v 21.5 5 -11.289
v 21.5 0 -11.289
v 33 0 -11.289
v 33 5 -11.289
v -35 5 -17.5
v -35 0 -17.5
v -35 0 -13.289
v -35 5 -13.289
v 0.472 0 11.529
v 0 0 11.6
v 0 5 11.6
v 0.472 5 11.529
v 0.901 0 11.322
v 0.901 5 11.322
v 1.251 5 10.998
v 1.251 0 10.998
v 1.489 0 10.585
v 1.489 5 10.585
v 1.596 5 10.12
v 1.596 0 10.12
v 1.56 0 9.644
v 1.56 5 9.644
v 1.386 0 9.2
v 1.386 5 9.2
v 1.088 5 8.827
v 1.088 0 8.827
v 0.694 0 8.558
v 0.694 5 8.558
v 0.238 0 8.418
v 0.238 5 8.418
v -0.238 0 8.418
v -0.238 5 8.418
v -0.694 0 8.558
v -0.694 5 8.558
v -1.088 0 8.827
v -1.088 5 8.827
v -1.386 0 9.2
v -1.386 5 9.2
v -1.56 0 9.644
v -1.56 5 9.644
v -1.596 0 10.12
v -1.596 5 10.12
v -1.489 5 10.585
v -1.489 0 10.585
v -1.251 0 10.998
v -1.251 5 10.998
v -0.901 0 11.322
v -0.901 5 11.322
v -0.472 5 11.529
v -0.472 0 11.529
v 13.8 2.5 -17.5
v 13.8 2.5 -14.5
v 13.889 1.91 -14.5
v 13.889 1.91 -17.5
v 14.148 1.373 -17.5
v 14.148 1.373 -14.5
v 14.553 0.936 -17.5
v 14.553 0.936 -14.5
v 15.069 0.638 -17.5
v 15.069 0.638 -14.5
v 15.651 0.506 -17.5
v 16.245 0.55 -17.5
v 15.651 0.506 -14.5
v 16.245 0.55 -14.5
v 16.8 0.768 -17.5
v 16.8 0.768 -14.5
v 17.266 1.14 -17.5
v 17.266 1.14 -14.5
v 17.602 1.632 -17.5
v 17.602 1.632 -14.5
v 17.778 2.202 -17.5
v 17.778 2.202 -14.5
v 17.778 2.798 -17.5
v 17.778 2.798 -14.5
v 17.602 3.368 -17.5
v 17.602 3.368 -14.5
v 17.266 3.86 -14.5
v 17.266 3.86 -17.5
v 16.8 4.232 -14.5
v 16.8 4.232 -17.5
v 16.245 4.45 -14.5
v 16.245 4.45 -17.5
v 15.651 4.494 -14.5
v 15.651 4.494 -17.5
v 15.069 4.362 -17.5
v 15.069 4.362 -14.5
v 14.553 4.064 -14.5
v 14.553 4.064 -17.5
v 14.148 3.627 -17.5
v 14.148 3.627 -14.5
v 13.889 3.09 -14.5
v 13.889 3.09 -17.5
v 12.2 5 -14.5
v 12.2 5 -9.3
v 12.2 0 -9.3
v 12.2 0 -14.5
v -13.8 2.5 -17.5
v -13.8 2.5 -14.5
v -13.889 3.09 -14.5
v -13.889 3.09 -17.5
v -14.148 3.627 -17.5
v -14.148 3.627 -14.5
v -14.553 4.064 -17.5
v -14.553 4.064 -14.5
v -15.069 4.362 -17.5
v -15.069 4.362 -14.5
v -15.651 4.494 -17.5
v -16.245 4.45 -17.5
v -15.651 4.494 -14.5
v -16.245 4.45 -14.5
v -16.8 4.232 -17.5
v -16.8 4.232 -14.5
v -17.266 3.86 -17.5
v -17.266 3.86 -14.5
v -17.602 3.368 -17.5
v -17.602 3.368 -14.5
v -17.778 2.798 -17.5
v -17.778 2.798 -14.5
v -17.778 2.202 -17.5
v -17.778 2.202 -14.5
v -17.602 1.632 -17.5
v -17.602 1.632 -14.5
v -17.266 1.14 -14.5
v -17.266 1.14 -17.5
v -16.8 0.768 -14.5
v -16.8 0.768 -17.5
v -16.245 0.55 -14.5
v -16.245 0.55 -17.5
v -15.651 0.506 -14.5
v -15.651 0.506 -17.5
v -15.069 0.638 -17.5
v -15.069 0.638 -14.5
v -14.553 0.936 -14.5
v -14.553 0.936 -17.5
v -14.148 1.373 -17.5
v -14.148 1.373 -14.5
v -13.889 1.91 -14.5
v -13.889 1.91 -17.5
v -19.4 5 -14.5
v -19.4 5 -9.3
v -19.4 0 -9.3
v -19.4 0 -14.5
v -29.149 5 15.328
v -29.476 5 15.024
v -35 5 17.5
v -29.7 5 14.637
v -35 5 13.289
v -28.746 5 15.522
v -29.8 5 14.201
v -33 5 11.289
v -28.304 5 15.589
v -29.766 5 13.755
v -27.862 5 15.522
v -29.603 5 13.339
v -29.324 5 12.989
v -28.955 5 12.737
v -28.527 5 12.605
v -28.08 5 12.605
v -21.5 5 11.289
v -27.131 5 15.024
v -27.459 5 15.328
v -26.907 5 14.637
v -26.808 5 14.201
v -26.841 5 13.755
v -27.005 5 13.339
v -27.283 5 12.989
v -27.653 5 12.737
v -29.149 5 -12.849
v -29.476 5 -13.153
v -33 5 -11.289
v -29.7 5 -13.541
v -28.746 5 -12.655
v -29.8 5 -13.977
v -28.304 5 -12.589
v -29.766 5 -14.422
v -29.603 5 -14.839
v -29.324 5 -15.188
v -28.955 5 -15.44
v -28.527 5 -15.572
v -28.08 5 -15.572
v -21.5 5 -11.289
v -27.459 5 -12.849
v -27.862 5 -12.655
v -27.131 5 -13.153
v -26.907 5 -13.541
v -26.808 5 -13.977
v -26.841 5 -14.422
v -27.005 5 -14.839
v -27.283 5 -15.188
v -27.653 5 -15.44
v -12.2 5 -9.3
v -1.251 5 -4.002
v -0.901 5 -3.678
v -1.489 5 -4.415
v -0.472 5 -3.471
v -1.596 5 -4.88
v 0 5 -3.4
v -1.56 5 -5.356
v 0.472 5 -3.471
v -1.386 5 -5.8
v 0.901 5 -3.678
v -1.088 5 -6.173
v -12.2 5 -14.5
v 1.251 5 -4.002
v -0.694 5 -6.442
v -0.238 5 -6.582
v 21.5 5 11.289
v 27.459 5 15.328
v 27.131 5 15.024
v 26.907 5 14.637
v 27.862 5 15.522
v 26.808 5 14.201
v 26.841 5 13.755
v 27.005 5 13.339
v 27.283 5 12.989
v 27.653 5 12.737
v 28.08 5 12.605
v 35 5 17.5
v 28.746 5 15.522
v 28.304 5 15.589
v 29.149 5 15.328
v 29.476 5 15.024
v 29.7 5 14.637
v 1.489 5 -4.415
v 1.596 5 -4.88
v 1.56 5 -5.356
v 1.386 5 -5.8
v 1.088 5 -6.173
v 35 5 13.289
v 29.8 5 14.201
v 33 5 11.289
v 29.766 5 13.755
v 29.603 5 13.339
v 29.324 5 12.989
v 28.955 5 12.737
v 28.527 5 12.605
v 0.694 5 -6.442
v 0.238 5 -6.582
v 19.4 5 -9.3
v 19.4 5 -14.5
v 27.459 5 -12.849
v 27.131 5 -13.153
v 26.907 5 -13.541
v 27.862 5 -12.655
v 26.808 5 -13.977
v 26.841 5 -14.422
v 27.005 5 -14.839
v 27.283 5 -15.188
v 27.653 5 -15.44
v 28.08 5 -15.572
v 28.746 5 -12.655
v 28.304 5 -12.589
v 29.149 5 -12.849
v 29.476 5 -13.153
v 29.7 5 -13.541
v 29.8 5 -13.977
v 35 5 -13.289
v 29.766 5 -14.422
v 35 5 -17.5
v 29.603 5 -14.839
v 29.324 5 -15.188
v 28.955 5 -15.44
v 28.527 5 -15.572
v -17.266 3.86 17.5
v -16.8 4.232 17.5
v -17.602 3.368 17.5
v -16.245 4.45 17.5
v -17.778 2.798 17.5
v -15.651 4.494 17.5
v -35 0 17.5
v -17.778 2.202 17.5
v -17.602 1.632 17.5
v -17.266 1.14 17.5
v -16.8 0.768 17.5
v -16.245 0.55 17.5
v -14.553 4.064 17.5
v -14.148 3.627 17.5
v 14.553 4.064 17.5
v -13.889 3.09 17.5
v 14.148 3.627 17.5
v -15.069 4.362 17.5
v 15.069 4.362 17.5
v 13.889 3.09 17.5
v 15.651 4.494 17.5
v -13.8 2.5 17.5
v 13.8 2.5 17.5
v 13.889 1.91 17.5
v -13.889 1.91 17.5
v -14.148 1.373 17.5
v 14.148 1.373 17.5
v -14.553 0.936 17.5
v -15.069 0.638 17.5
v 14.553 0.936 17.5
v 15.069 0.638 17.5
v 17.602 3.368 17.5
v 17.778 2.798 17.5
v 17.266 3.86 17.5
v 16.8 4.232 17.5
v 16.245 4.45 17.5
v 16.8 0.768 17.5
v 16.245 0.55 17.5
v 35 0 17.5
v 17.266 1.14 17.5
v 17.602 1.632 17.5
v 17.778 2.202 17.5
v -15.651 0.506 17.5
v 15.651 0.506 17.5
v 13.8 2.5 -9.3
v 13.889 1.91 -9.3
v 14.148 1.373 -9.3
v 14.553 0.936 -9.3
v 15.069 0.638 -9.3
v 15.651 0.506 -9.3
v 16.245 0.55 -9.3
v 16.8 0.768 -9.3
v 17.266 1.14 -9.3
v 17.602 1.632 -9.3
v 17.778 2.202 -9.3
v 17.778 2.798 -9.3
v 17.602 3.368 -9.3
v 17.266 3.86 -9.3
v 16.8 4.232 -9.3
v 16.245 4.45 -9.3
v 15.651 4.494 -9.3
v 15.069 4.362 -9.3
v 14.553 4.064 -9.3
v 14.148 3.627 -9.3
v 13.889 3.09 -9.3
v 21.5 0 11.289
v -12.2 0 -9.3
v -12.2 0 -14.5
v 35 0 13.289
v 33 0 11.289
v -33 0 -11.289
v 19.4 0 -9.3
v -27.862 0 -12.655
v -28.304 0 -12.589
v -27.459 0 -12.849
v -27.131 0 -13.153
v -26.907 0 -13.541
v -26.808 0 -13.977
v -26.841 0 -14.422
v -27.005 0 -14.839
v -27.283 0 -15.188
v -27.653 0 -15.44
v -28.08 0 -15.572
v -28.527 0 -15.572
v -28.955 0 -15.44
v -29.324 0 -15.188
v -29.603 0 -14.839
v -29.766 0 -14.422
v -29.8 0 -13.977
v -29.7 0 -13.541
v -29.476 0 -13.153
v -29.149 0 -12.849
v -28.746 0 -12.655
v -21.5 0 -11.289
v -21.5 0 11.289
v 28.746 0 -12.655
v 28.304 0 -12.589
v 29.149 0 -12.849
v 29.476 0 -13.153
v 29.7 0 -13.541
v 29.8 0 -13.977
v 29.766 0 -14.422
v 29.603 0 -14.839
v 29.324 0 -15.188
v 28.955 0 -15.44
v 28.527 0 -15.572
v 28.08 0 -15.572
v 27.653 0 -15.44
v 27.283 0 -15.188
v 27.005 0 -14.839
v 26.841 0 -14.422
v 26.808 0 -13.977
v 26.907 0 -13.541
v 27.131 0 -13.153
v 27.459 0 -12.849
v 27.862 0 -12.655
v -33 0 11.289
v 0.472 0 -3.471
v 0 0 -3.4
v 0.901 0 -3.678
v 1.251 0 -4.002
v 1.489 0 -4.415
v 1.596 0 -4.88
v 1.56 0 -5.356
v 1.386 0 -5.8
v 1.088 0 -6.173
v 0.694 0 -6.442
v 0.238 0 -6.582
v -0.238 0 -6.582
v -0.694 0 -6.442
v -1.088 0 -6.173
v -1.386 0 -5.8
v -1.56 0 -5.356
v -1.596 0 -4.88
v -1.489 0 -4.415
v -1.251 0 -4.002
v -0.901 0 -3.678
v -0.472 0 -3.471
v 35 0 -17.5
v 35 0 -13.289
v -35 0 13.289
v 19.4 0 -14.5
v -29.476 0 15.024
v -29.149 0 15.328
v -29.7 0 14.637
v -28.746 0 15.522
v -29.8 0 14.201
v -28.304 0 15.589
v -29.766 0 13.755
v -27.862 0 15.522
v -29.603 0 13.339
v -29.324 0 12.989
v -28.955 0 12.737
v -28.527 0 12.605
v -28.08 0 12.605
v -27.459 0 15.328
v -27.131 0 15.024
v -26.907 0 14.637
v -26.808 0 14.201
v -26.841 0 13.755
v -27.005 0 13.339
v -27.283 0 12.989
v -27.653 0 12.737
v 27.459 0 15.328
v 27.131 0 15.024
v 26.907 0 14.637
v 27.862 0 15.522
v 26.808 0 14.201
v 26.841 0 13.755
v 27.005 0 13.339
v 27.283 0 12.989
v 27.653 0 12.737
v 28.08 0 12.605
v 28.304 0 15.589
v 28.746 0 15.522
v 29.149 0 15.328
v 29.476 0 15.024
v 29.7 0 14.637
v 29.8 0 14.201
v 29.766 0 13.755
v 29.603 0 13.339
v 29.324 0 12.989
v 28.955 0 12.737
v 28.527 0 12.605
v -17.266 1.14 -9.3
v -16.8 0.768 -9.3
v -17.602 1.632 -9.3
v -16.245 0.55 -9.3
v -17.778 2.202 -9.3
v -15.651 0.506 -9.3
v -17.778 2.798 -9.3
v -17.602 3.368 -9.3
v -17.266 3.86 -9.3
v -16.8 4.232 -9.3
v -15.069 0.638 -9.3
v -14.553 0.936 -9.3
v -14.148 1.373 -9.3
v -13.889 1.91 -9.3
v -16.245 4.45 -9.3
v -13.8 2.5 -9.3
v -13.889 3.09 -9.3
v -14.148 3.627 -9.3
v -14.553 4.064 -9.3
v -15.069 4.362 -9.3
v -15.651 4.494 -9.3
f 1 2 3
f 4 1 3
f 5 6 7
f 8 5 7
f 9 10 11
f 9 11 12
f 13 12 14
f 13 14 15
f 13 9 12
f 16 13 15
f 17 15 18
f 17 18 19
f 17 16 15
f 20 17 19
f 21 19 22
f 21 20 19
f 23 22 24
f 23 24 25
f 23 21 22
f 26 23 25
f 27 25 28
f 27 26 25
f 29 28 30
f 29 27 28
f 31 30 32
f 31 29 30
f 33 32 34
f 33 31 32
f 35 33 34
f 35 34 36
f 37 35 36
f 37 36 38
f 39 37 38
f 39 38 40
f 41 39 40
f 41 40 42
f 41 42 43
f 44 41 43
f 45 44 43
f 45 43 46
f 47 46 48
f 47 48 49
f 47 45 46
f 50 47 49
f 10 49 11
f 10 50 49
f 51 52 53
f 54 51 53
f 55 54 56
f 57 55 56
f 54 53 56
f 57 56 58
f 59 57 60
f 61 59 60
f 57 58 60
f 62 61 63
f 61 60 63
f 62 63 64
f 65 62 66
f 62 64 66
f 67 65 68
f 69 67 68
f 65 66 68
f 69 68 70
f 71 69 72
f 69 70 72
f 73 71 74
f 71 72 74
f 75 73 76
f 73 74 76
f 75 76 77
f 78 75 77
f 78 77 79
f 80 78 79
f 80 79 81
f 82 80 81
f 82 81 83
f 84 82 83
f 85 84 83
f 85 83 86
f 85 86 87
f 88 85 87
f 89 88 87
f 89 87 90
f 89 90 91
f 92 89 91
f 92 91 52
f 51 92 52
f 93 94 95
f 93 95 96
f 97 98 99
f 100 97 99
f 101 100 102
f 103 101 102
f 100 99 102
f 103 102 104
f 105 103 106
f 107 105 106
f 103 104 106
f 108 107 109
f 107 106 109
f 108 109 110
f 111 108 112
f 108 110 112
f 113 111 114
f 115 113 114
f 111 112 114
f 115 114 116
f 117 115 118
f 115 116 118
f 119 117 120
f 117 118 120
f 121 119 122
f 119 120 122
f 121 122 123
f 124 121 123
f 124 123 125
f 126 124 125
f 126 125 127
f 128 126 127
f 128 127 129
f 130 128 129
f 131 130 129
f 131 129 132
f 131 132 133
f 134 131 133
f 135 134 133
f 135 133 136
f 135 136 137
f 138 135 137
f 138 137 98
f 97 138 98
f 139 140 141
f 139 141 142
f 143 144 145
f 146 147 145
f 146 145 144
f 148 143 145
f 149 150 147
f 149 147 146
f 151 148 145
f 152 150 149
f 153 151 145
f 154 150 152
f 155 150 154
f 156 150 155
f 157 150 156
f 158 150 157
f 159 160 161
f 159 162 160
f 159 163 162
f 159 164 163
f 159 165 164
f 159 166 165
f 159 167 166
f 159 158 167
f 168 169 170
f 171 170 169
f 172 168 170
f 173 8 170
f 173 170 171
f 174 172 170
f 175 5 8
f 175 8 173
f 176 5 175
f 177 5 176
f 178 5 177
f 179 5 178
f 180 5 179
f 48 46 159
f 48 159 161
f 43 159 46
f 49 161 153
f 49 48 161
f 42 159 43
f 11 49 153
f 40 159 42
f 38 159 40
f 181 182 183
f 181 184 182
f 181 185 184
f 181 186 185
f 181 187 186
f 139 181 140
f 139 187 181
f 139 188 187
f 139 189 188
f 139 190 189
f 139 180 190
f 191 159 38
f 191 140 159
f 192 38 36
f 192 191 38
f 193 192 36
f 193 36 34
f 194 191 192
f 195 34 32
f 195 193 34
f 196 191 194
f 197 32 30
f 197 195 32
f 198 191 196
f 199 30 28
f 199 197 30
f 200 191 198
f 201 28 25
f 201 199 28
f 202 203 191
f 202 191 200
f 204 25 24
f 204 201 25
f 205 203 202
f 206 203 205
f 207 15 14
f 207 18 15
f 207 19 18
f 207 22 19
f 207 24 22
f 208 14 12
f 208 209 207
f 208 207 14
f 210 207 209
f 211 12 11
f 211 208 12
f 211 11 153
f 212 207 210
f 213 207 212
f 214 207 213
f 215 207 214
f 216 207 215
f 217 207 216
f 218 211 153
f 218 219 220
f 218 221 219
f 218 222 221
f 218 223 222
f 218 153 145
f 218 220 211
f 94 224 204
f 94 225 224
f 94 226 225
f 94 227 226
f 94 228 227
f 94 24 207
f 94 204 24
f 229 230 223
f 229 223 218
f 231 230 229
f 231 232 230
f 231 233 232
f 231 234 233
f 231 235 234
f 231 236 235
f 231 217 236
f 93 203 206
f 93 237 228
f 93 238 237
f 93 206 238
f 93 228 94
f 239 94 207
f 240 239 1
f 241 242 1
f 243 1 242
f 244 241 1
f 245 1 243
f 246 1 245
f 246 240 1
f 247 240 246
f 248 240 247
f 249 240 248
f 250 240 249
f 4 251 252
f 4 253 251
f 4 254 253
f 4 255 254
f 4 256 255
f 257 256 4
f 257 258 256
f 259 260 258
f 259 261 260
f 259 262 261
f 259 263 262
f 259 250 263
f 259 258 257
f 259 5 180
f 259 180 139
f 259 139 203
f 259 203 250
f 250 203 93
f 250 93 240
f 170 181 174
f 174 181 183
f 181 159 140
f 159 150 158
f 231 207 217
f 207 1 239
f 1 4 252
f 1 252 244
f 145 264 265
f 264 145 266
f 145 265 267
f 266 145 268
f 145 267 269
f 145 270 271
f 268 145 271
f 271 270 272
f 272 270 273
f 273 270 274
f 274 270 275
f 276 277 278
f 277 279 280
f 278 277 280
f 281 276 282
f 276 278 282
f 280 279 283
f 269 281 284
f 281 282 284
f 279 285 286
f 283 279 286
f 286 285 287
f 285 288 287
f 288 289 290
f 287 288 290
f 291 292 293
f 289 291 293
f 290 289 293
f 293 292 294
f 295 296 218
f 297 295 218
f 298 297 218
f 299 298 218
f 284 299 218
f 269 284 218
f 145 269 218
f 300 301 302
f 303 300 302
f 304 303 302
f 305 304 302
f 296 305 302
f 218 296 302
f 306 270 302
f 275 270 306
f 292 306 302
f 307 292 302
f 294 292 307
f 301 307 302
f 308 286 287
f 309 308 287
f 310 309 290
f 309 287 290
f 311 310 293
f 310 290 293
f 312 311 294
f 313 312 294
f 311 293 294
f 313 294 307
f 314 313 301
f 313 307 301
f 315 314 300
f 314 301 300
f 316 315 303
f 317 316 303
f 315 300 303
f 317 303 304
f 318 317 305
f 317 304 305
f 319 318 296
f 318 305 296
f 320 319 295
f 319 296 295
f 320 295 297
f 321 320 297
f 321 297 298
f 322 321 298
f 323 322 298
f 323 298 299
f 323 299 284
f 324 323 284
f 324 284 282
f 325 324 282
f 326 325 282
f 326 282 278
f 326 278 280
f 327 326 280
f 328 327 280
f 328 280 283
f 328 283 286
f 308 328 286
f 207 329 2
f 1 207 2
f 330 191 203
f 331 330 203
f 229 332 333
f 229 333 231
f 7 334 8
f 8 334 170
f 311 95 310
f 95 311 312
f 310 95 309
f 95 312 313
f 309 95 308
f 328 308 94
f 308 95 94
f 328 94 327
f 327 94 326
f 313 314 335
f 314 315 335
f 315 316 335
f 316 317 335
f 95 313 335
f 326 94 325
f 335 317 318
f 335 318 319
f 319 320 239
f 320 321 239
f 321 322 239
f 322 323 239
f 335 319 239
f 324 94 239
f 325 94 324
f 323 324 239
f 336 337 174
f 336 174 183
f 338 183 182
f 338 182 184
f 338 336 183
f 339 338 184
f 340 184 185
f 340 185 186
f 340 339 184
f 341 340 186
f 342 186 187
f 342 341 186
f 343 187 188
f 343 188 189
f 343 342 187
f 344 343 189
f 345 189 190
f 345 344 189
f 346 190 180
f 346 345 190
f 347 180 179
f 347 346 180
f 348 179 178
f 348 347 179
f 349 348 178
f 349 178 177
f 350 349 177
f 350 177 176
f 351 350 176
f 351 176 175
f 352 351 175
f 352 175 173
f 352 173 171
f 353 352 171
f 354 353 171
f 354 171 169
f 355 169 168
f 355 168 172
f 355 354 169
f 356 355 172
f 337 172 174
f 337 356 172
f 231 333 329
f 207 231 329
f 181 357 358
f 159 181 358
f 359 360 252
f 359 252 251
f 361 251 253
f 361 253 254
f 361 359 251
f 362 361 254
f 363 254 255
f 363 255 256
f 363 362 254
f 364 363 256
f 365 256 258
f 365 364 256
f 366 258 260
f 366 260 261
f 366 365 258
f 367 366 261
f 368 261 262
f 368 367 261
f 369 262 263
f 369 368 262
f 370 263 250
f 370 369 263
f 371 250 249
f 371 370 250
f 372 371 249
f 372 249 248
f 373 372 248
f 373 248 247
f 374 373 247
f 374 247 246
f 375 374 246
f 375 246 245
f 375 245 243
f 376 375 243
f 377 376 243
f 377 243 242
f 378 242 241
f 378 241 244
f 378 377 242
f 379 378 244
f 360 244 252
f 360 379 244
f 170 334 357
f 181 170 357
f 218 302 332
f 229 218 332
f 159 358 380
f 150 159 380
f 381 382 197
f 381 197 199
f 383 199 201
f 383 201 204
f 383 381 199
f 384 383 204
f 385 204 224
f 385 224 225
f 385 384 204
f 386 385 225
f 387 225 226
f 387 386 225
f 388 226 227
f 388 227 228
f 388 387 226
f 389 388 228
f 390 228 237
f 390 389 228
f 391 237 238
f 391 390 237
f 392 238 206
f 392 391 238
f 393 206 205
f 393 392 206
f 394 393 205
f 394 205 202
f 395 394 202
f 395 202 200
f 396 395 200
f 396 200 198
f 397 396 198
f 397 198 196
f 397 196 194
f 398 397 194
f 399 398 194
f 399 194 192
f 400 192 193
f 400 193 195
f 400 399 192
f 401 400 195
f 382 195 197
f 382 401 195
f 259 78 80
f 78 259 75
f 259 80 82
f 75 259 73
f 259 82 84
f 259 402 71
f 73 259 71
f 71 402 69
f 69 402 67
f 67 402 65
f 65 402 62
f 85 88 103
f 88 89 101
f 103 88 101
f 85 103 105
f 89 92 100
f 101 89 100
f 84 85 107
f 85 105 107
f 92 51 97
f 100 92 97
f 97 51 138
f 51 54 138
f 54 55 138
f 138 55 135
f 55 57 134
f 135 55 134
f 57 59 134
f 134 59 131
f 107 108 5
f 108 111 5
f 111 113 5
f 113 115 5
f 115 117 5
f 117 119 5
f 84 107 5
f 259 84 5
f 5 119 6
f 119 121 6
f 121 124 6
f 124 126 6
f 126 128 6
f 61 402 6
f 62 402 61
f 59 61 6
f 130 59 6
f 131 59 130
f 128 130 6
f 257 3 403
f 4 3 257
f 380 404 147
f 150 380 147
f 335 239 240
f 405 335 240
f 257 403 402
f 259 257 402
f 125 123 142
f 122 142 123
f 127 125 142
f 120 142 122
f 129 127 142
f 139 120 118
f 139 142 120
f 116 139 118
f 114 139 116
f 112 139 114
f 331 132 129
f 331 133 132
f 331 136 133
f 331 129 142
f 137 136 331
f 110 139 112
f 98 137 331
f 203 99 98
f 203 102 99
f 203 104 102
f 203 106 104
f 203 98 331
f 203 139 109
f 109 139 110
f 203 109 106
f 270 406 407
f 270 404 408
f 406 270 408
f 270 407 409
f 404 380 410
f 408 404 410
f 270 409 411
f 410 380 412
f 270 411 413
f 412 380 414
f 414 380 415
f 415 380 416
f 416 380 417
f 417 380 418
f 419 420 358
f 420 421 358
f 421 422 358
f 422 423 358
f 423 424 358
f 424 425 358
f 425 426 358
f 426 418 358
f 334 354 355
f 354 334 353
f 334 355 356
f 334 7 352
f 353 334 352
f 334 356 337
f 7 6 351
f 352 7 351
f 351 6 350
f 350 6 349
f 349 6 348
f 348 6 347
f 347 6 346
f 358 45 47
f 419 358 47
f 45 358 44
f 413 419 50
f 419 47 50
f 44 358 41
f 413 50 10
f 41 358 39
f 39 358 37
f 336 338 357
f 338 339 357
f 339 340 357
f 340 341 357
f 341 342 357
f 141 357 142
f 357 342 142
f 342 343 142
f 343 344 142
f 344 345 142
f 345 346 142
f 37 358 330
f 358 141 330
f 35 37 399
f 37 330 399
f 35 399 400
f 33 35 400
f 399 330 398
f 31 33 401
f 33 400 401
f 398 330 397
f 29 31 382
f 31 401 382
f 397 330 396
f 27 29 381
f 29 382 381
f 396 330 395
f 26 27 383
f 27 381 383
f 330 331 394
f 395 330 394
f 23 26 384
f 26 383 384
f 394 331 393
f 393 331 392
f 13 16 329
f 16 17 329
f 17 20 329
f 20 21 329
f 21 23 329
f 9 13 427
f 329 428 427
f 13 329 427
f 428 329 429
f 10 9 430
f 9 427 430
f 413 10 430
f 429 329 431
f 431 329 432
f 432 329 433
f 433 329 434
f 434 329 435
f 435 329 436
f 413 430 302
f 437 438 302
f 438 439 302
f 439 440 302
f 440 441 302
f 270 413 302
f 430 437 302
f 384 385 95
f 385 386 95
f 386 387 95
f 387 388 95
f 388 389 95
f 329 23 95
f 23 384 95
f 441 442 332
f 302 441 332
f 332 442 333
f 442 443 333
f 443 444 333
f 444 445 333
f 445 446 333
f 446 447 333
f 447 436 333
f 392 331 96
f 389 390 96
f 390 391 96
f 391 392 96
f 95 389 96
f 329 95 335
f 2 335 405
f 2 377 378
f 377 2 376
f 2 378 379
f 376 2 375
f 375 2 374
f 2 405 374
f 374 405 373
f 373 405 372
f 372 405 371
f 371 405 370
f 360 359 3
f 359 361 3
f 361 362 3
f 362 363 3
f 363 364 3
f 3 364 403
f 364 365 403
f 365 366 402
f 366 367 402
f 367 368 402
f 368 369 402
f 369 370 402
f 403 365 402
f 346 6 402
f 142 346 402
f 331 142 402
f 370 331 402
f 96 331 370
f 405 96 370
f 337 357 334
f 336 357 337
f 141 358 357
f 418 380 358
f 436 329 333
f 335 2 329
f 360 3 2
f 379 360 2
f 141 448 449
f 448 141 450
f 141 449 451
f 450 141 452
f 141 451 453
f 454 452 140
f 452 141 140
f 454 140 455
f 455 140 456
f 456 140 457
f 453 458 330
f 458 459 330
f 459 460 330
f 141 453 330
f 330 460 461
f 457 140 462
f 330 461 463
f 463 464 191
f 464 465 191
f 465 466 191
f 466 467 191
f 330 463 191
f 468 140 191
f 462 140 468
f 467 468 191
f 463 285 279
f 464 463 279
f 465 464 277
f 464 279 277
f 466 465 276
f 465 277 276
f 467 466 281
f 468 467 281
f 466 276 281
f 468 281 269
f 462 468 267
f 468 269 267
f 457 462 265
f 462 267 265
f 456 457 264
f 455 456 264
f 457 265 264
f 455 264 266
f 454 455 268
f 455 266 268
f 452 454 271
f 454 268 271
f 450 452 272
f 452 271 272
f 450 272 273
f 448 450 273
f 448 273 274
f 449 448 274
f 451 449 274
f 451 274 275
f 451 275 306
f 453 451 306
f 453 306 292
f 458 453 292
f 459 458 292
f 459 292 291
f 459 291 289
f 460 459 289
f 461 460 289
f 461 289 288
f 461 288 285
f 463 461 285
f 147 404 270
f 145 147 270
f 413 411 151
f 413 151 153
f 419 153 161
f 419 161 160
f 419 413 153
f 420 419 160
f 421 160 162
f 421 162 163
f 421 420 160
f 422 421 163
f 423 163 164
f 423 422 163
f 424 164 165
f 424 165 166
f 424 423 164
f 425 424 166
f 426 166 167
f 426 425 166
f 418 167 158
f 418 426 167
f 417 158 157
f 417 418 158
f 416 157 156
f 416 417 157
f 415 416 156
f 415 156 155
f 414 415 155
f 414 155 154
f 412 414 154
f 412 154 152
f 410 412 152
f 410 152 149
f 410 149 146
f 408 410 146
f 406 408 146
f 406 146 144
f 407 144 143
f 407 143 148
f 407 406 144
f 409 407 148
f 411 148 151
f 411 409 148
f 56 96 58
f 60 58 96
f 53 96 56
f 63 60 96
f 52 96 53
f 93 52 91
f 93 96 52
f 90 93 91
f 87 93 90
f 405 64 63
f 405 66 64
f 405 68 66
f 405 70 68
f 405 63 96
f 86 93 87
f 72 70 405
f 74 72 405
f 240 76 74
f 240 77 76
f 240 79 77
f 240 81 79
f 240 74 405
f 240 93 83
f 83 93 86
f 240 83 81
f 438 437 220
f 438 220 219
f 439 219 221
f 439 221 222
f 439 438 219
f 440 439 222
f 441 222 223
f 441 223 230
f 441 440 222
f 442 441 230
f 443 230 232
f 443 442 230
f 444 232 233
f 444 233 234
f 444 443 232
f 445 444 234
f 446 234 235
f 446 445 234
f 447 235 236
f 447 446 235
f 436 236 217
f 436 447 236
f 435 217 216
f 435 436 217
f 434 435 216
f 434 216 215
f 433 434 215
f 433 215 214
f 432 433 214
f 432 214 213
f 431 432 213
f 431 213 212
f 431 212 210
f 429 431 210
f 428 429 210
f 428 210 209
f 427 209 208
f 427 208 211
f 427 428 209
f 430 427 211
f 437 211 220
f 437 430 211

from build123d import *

# Parameters (mm, degrees)
SKETCH_1_R          = 1.5
SKETCH_1_R_2        = 1.6
EXTRUDE_1_DEPTH     = 5
CHAMFER_1_SIZE      = 2
SKETCH_2_R          = 2
CUT_EXTRUDE_1_DEPTH = 50.749371855
SKETCH_3_W          = 7.2
SKETCH_3_H          = 5.2
CUT_EXTRUDE_2_DEPTH = 40.449334595


with BuildPart() as part:
    # 草图1 → 凸台-拉伸1 (new body)
    with BuildSketch(Plane(origin=(0, 0, 0), x_dir=(1, 0, 0), z_dir=(0, 1, 0))):
        Polygon((35, 17.5), (-35, 17.5), (-35, 11.288596674), (-21.49999999, 11.288596674), (-21.49999999, -11.288596674), (-35, -11.288596674), (-35, -17.5), (35, -17.5), (35, -11.288596674), (21.49999999, -11.288596674), (21.49999999, 11.288596674), (35, 11.288596674), align=None)
        with Locations(Location((-28.303727501, -14.088596674, 0), (0, 0, 270))):
            Circle(SKETCH_1_R, mode=Mode.SUBTRACT)
        with Locations(Location((0, -10, 0), (0, 0, 270))):
            Circle(SKETCH_1_R_2, mode=Mode.SUBTRACT)
        with Locations(Location((28.303727501, -14.088596674, 0), (0, 0, 270))):
            Circle(SKETCH_1_R, mode=Mode.SUBTRACT)
        with Locations(Location((-28.303727501, 14.088596674, 0), (0, 0, 270))):
            Circle(SKETCH_1_R, mode=Mode.SUBTRACT)
        with Locations(Location((0, 5, 0), (0, 0, 270))):
            Circle(SKETCH_1_R_2, mode=Mode.SUBTRACT)
        with Locations(Location((28.303727501, 14.088596674, 0), (0, 0, 270))):
            Circle(SKETCH_1_R, mode=Mode.SUBTRACT)
    extrude(amount=EXTRUDE_1_DEPTH)

    # 倒角1
    chamfer_1_edges = [part.edges().sort_by_distance(p)[0] for p in [
        (35, 2.5, 11.288596674),
        (-35, 2.5, 11.288596674),
        (-35, 2.5, -11.288596674),
        (35, 2.5, -11.288596674),
    ]]
    chamfer(chamfer_1_edges, length=CHAMFER_1_SIZE)

    # 草图2 → 切除-拉伸1 (cut, through all)
    with BuildSketch(Plane.XY.offset(17.5)):
        with Locations((-15.8, 2.5)):
            Circle(SKETCH_2_R)
        with Locations(Location((15.8, 2.5, 0), (0, 0, 180))):
            Circle(SKETCH_2_R)
    extrude(amount=-CUT_EXTRUDE_1_DEPTH, mode=Mode.SUBTRACT)

    # 草图3 → 切除-拉伸2 (cut, through all)
    with BuildSketch(Plane(origin=(0, 5, 0), x_dir=(1, 0, 0), z_dir=(0, 1, 0))):
        with Locations((-15.8, 11.9)):
            Rectangle(SKETCH_3_W, SKETCH_3_H)
        with Locations((15.8, 11.9)):
            Rectangle(SKETCH_3_W, SKETCH_3_H)
    extrude(amount=-CUT_EXTRUDE_2_DEPTH, mode=Mode.SUBTRACT)


solid = part.part
